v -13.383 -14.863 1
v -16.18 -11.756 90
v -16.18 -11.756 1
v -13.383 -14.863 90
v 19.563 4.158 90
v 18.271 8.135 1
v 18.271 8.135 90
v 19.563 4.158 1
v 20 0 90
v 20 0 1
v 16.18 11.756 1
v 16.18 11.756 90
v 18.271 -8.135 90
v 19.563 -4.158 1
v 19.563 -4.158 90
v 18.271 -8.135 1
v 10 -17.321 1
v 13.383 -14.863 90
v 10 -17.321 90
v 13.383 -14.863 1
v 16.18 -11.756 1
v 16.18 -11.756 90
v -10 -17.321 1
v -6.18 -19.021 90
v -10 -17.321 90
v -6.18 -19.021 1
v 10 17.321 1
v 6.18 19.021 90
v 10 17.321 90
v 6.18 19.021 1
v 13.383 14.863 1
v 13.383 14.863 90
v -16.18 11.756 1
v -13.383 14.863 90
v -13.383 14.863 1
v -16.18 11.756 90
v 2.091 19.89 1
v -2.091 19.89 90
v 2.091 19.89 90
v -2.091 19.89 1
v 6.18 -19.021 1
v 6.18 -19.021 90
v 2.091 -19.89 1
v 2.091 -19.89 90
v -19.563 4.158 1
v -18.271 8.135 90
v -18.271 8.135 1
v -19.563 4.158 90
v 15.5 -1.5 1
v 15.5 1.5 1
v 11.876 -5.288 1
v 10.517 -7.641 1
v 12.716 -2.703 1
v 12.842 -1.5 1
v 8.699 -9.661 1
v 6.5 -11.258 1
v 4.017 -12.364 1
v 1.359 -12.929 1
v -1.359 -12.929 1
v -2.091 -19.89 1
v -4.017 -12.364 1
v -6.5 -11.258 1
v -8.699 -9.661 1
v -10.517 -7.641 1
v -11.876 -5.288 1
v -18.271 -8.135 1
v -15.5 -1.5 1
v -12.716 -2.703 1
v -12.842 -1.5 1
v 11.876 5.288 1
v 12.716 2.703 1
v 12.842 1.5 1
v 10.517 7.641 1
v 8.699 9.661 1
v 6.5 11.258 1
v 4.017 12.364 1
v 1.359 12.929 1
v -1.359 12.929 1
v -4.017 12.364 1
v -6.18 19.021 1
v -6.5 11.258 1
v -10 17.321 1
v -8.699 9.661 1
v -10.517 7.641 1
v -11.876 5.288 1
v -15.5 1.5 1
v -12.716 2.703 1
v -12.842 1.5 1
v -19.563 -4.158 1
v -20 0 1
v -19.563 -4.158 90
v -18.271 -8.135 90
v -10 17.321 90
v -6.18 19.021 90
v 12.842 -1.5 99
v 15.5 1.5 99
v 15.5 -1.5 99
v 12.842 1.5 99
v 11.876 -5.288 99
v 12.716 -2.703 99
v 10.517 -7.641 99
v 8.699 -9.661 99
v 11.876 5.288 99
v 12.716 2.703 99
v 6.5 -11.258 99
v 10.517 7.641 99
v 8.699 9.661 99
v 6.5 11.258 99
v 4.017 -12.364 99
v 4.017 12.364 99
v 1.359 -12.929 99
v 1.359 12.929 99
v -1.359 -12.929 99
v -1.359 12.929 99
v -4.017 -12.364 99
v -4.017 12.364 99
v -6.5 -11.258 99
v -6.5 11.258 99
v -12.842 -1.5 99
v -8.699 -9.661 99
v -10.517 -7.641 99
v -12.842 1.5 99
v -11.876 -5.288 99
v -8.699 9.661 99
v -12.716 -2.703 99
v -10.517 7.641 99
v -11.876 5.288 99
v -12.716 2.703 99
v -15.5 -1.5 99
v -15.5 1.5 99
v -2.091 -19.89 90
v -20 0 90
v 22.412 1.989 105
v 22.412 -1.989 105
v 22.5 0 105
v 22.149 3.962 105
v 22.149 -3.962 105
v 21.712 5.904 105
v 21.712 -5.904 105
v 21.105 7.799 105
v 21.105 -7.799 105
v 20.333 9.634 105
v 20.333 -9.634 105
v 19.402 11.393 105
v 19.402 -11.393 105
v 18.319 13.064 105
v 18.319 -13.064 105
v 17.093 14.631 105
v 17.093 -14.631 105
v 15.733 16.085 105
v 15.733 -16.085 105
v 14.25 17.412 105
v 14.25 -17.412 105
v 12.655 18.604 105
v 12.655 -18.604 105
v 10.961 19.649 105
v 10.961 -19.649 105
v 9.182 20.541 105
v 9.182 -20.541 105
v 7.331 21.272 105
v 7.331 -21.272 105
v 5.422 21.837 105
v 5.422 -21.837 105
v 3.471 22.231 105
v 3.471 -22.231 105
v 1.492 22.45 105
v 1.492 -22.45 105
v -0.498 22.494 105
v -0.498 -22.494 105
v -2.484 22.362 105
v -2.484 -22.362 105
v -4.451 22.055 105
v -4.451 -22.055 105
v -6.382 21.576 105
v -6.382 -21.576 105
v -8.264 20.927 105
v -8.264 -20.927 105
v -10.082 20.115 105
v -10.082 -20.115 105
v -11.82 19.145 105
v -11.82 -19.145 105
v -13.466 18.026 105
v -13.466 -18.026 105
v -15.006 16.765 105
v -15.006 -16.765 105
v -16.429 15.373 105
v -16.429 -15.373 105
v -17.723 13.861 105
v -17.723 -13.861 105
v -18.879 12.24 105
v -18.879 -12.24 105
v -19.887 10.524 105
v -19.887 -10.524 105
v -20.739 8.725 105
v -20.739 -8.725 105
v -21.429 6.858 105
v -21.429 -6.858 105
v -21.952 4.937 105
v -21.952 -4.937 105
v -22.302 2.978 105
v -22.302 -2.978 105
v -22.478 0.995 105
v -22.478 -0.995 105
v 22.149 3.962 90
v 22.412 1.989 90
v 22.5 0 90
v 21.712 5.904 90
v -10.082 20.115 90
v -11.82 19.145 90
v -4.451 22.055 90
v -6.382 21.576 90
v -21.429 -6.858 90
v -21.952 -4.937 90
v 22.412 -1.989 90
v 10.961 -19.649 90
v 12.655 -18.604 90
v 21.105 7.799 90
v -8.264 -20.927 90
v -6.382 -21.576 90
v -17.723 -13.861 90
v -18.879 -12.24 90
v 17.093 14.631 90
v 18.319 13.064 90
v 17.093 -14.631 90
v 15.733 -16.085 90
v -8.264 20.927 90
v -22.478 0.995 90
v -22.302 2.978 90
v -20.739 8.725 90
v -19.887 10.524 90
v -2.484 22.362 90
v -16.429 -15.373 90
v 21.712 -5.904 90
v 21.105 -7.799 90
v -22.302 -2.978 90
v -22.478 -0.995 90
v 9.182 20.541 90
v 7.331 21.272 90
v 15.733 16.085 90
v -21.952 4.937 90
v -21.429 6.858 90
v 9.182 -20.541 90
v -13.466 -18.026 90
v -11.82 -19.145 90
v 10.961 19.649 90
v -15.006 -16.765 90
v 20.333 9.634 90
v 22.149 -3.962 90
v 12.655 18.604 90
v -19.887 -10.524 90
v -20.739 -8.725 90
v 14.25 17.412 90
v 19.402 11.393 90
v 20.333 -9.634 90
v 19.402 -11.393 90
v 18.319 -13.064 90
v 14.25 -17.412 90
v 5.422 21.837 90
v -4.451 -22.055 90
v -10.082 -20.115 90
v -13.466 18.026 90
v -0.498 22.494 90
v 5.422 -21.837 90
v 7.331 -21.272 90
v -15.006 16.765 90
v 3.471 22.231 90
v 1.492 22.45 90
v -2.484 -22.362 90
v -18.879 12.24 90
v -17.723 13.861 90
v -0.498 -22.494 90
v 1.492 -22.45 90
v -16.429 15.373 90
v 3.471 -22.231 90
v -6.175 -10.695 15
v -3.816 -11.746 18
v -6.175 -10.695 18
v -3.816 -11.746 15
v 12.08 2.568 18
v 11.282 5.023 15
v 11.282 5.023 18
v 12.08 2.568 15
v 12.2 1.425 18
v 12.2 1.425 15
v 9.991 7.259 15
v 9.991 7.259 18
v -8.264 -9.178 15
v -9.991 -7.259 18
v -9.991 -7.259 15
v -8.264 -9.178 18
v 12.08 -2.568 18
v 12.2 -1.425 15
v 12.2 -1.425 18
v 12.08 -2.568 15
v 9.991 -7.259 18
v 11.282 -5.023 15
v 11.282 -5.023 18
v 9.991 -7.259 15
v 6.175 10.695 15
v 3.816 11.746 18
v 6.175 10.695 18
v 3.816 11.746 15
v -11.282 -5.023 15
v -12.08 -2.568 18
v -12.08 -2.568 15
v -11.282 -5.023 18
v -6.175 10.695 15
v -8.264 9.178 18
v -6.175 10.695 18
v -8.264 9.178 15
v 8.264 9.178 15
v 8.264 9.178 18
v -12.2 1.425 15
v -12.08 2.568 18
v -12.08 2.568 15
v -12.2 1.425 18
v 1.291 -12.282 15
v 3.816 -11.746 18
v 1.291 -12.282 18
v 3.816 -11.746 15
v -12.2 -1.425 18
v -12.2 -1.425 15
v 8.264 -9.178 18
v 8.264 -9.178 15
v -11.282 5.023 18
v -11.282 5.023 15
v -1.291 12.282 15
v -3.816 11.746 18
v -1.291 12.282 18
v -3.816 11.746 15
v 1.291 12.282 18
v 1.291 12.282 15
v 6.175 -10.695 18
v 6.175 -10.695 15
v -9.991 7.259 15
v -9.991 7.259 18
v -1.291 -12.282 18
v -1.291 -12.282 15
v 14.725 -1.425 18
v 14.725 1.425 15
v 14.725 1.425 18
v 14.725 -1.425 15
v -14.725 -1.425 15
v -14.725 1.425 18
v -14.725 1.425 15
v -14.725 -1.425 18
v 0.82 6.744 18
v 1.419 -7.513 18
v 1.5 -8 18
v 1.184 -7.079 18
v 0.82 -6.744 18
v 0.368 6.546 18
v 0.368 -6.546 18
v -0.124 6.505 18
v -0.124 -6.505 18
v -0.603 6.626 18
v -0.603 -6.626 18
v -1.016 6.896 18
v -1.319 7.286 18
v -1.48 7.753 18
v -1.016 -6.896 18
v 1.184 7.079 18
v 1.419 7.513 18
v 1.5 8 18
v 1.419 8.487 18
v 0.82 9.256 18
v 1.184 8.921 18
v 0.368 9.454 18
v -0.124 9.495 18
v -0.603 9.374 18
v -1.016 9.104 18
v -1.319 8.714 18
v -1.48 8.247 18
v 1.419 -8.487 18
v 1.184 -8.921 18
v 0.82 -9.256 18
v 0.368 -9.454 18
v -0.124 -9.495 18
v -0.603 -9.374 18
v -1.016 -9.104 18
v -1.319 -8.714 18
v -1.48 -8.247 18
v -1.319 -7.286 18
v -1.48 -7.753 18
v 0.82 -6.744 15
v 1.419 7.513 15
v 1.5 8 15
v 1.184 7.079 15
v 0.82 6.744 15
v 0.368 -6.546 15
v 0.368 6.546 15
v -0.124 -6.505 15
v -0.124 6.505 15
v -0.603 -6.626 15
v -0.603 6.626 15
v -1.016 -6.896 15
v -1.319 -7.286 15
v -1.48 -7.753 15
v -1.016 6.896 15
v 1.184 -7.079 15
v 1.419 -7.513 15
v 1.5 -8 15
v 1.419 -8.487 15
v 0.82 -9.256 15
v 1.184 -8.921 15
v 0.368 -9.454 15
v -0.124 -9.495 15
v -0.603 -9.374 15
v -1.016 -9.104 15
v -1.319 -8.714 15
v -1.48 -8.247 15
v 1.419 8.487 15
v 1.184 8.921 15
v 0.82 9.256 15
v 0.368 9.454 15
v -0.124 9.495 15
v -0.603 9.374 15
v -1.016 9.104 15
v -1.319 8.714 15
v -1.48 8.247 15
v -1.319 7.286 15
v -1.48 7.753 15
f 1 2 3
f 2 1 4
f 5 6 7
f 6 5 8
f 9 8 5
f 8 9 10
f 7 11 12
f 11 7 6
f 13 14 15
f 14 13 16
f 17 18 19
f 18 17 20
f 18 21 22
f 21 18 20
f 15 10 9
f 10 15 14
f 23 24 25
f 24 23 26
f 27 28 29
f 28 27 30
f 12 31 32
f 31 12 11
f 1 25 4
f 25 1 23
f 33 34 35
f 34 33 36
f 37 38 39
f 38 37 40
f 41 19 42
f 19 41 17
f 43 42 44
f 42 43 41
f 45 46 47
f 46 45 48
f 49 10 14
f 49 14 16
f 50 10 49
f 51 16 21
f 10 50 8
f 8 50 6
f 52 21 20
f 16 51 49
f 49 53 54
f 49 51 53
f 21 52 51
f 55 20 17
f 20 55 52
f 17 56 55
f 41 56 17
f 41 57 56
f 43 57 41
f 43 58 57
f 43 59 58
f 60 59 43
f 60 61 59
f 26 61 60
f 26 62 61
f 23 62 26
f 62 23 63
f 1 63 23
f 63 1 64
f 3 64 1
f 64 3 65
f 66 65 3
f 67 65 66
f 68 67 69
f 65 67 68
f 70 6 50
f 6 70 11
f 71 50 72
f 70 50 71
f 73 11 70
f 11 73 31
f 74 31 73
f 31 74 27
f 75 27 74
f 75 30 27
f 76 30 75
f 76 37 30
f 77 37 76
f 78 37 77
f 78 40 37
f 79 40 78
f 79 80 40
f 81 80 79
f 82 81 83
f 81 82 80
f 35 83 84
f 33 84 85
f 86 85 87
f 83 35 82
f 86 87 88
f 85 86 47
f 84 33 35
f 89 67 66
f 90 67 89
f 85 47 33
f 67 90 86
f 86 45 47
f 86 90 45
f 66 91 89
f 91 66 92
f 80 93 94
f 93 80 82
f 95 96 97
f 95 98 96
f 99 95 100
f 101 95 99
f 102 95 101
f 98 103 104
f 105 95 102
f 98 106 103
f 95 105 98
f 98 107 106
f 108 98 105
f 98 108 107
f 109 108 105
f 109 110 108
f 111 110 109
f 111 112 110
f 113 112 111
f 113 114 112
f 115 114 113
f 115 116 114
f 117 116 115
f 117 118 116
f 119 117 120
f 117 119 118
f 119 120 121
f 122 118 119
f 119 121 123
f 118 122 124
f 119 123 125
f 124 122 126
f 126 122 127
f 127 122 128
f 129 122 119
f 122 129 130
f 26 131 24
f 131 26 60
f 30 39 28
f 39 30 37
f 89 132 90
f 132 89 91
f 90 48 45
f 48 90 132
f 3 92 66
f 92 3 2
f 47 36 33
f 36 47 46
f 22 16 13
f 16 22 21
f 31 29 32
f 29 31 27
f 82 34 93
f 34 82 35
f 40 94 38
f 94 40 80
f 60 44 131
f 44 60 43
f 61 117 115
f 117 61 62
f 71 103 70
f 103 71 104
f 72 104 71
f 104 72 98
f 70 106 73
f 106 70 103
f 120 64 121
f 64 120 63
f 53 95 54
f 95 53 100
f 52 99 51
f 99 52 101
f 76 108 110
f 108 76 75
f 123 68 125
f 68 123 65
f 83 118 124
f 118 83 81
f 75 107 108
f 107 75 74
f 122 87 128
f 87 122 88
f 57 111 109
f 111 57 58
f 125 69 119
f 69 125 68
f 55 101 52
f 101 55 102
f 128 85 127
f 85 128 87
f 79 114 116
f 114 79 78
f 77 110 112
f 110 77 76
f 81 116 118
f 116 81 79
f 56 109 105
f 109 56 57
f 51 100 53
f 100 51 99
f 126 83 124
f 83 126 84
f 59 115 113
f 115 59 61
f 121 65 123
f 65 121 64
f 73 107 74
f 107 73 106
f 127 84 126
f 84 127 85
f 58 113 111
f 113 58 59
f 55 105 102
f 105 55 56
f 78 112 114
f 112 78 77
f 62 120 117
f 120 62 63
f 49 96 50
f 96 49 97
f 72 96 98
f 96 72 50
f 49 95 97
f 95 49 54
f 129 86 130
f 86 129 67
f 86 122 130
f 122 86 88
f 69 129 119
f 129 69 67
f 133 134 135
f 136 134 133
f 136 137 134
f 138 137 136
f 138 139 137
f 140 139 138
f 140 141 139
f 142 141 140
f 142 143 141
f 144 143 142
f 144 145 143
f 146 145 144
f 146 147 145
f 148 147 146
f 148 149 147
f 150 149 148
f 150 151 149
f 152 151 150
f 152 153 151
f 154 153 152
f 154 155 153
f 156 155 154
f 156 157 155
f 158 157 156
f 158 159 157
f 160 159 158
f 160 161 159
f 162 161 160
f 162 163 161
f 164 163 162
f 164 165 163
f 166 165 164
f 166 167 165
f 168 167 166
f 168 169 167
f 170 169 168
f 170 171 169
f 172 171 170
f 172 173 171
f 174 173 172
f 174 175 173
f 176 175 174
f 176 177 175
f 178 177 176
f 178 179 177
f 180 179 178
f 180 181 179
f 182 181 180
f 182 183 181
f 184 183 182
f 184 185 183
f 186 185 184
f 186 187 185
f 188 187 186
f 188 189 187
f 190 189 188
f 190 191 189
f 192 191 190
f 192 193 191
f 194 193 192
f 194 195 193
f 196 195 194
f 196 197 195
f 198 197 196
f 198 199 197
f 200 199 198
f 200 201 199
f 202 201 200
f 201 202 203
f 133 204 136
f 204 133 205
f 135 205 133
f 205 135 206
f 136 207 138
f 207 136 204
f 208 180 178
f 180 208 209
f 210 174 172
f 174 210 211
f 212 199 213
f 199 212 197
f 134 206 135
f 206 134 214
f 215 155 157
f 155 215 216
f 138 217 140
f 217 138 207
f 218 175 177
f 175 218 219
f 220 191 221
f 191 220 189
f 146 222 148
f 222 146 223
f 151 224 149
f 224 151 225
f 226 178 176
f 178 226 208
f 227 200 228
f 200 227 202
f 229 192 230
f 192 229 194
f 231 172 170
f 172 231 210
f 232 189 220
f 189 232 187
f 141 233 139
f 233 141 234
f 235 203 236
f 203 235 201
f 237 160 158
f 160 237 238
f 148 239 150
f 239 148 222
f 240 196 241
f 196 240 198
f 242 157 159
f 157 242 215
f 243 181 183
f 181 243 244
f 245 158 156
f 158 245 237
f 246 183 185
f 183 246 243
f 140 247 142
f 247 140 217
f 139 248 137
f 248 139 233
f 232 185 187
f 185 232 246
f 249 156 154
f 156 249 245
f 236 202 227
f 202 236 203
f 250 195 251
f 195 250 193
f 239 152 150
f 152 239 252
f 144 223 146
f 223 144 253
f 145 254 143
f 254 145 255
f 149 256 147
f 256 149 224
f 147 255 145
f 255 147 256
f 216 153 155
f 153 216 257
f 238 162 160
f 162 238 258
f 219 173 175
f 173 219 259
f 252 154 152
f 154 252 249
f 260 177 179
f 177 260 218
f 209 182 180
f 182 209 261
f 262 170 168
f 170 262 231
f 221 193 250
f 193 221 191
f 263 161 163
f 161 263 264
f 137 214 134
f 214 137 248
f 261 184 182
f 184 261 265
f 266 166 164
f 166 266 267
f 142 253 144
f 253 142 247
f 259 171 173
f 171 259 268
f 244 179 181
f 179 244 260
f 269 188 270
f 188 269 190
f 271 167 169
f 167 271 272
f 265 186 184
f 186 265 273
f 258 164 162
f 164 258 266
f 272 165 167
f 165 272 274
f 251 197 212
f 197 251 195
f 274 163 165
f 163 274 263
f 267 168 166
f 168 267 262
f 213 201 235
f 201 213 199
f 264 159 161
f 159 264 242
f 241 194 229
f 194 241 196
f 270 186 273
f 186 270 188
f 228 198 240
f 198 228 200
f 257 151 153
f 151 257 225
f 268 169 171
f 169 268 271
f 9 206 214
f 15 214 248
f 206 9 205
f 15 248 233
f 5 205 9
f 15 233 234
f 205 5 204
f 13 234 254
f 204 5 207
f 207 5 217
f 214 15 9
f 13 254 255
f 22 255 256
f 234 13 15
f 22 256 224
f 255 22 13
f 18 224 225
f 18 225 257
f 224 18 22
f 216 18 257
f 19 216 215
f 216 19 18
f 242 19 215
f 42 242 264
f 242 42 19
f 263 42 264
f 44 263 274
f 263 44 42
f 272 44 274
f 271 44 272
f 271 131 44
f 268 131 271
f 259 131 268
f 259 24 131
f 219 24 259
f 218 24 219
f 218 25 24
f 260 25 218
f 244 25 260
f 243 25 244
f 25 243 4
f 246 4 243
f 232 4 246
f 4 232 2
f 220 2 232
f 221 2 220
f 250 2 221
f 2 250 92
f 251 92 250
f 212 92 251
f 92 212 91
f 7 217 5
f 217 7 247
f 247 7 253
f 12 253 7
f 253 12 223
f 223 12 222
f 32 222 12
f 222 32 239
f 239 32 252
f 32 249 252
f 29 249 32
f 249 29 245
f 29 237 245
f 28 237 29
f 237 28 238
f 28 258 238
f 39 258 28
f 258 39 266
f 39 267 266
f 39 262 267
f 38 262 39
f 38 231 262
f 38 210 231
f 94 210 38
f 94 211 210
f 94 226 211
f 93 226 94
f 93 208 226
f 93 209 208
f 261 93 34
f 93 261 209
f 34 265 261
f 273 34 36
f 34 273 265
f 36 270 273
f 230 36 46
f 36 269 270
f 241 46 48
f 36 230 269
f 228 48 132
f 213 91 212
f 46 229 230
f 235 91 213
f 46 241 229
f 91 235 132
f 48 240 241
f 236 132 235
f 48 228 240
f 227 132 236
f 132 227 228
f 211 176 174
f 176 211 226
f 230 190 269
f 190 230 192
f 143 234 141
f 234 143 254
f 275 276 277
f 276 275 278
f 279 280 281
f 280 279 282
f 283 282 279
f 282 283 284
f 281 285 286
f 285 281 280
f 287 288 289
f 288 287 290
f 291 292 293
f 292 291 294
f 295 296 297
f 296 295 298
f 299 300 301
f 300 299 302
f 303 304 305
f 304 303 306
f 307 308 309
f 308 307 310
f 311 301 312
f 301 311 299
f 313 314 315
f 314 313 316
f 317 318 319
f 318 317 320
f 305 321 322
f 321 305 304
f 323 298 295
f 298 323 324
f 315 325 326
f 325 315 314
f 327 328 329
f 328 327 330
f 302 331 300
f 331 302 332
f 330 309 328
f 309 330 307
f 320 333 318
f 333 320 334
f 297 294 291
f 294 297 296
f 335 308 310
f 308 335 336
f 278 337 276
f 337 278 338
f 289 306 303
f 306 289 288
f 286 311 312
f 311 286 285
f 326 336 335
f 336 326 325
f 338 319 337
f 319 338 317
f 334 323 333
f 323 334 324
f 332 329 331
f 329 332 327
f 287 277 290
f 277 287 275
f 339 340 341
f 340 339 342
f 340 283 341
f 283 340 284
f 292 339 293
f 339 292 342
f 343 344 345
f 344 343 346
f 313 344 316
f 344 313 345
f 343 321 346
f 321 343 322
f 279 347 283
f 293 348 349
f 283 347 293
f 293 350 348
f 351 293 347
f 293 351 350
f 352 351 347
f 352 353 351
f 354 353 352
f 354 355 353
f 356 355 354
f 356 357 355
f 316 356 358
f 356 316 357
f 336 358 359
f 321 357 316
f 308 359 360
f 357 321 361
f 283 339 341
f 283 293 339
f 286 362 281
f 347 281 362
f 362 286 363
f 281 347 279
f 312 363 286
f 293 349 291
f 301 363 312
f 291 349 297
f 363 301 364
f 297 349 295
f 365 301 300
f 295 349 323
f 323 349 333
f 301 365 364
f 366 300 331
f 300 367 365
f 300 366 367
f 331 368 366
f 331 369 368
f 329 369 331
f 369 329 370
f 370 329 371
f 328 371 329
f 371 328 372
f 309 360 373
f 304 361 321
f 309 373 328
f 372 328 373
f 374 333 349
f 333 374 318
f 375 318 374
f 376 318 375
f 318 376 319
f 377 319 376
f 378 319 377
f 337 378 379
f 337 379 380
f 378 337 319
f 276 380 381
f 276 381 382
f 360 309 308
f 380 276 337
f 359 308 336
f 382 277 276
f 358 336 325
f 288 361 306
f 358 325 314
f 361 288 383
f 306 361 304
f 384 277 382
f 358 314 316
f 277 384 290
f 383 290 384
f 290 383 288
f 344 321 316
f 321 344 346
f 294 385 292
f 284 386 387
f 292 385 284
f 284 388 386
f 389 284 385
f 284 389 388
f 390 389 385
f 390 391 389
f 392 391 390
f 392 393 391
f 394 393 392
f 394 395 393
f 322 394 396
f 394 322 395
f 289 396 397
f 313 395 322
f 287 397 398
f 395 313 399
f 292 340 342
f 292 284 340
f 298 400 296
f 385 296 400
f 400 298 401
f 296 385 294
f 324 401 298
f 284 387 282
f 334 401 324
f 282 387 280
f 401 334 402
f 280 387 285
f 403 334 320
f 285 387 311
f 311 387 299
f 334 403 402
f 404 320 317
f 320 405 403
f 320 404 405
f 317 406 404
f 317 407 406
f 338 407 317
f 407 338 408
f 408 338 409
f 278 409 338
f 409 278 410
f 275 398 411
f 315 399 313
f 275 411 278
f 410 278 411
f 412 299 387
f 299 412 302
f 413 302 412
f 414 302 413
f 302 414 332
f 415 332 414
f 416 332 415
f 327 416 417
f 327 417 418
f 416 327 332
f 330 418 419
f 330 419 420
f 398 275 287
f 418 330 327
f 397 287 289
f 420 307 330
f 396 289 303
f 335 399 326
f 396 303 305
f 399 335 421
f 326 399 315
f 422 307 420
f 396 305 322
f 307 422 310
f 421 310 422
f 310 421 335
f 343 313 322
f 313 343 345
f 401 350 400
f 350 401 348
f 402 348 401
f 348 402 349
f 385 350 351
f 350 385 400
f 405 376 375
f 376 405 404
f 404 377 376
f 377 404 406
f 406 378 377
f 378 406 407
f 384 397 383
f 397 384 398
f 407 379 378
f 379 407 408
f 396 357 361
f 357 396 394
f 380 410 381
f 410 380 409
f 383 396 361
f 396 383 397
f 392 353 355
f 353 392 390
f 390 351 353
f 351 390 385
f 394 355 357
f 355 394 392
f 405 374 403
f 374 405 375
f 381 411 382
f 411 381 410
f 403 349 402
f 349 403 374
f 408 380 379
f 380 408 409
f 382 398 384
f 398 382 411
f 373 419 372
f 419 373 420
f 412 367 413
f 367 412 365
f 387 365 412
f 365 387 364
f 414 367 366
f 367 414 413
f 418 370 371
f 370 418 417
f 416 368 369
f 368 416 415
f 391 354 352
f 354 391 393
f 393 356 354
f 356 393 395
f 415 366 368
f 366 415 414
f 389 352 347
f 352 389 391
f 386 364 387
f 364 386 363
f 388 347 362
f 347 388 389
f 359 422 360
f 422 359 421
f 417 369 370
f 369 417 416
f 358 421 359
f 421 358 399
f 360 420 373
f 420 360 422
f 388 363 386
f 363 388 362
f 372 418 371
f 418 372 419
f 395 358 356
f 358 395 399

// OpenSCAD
module magbarrel(){
    union(){
        difference(){
            
            translate([0,0,1]){
                cylinder(h=98, d=40, $fs = 0.5);
            }
            cylinder(h=100, d= 26, $fs = 0.5);
            
            translate([14,0,52])
                cube([3,3,105], center=true);
            translate([-14,0,52])
                cube([3,3,105], center=true);
            
        }
    }
}

module magback(){

        difference(){
            translate([0,0,90])
                cylinder(h = 15, d=45, $fa=0.1);
            magbarrel();
            translate([0,0,88])
                cylinder(h=11, d=40);
            
        }
  
    
}

module prefollower(){
    
    scale([0.95,0.95,1]){
        difference(){
            translate([0,0,15])
                cylinder(h=3, d=38);
            magbarrel();
        }
    }
}

module follower(){
    difference(){
        
        prefollower();
        
        translate([0,-8,0])
            cylinder(h=20, d=3, $fs=0.5);
        translate([0,8,0])
            cylinder(h=20, d=3, $fs=0.5);
        
    }
    
}


magbarrel();

magback();

follower();
